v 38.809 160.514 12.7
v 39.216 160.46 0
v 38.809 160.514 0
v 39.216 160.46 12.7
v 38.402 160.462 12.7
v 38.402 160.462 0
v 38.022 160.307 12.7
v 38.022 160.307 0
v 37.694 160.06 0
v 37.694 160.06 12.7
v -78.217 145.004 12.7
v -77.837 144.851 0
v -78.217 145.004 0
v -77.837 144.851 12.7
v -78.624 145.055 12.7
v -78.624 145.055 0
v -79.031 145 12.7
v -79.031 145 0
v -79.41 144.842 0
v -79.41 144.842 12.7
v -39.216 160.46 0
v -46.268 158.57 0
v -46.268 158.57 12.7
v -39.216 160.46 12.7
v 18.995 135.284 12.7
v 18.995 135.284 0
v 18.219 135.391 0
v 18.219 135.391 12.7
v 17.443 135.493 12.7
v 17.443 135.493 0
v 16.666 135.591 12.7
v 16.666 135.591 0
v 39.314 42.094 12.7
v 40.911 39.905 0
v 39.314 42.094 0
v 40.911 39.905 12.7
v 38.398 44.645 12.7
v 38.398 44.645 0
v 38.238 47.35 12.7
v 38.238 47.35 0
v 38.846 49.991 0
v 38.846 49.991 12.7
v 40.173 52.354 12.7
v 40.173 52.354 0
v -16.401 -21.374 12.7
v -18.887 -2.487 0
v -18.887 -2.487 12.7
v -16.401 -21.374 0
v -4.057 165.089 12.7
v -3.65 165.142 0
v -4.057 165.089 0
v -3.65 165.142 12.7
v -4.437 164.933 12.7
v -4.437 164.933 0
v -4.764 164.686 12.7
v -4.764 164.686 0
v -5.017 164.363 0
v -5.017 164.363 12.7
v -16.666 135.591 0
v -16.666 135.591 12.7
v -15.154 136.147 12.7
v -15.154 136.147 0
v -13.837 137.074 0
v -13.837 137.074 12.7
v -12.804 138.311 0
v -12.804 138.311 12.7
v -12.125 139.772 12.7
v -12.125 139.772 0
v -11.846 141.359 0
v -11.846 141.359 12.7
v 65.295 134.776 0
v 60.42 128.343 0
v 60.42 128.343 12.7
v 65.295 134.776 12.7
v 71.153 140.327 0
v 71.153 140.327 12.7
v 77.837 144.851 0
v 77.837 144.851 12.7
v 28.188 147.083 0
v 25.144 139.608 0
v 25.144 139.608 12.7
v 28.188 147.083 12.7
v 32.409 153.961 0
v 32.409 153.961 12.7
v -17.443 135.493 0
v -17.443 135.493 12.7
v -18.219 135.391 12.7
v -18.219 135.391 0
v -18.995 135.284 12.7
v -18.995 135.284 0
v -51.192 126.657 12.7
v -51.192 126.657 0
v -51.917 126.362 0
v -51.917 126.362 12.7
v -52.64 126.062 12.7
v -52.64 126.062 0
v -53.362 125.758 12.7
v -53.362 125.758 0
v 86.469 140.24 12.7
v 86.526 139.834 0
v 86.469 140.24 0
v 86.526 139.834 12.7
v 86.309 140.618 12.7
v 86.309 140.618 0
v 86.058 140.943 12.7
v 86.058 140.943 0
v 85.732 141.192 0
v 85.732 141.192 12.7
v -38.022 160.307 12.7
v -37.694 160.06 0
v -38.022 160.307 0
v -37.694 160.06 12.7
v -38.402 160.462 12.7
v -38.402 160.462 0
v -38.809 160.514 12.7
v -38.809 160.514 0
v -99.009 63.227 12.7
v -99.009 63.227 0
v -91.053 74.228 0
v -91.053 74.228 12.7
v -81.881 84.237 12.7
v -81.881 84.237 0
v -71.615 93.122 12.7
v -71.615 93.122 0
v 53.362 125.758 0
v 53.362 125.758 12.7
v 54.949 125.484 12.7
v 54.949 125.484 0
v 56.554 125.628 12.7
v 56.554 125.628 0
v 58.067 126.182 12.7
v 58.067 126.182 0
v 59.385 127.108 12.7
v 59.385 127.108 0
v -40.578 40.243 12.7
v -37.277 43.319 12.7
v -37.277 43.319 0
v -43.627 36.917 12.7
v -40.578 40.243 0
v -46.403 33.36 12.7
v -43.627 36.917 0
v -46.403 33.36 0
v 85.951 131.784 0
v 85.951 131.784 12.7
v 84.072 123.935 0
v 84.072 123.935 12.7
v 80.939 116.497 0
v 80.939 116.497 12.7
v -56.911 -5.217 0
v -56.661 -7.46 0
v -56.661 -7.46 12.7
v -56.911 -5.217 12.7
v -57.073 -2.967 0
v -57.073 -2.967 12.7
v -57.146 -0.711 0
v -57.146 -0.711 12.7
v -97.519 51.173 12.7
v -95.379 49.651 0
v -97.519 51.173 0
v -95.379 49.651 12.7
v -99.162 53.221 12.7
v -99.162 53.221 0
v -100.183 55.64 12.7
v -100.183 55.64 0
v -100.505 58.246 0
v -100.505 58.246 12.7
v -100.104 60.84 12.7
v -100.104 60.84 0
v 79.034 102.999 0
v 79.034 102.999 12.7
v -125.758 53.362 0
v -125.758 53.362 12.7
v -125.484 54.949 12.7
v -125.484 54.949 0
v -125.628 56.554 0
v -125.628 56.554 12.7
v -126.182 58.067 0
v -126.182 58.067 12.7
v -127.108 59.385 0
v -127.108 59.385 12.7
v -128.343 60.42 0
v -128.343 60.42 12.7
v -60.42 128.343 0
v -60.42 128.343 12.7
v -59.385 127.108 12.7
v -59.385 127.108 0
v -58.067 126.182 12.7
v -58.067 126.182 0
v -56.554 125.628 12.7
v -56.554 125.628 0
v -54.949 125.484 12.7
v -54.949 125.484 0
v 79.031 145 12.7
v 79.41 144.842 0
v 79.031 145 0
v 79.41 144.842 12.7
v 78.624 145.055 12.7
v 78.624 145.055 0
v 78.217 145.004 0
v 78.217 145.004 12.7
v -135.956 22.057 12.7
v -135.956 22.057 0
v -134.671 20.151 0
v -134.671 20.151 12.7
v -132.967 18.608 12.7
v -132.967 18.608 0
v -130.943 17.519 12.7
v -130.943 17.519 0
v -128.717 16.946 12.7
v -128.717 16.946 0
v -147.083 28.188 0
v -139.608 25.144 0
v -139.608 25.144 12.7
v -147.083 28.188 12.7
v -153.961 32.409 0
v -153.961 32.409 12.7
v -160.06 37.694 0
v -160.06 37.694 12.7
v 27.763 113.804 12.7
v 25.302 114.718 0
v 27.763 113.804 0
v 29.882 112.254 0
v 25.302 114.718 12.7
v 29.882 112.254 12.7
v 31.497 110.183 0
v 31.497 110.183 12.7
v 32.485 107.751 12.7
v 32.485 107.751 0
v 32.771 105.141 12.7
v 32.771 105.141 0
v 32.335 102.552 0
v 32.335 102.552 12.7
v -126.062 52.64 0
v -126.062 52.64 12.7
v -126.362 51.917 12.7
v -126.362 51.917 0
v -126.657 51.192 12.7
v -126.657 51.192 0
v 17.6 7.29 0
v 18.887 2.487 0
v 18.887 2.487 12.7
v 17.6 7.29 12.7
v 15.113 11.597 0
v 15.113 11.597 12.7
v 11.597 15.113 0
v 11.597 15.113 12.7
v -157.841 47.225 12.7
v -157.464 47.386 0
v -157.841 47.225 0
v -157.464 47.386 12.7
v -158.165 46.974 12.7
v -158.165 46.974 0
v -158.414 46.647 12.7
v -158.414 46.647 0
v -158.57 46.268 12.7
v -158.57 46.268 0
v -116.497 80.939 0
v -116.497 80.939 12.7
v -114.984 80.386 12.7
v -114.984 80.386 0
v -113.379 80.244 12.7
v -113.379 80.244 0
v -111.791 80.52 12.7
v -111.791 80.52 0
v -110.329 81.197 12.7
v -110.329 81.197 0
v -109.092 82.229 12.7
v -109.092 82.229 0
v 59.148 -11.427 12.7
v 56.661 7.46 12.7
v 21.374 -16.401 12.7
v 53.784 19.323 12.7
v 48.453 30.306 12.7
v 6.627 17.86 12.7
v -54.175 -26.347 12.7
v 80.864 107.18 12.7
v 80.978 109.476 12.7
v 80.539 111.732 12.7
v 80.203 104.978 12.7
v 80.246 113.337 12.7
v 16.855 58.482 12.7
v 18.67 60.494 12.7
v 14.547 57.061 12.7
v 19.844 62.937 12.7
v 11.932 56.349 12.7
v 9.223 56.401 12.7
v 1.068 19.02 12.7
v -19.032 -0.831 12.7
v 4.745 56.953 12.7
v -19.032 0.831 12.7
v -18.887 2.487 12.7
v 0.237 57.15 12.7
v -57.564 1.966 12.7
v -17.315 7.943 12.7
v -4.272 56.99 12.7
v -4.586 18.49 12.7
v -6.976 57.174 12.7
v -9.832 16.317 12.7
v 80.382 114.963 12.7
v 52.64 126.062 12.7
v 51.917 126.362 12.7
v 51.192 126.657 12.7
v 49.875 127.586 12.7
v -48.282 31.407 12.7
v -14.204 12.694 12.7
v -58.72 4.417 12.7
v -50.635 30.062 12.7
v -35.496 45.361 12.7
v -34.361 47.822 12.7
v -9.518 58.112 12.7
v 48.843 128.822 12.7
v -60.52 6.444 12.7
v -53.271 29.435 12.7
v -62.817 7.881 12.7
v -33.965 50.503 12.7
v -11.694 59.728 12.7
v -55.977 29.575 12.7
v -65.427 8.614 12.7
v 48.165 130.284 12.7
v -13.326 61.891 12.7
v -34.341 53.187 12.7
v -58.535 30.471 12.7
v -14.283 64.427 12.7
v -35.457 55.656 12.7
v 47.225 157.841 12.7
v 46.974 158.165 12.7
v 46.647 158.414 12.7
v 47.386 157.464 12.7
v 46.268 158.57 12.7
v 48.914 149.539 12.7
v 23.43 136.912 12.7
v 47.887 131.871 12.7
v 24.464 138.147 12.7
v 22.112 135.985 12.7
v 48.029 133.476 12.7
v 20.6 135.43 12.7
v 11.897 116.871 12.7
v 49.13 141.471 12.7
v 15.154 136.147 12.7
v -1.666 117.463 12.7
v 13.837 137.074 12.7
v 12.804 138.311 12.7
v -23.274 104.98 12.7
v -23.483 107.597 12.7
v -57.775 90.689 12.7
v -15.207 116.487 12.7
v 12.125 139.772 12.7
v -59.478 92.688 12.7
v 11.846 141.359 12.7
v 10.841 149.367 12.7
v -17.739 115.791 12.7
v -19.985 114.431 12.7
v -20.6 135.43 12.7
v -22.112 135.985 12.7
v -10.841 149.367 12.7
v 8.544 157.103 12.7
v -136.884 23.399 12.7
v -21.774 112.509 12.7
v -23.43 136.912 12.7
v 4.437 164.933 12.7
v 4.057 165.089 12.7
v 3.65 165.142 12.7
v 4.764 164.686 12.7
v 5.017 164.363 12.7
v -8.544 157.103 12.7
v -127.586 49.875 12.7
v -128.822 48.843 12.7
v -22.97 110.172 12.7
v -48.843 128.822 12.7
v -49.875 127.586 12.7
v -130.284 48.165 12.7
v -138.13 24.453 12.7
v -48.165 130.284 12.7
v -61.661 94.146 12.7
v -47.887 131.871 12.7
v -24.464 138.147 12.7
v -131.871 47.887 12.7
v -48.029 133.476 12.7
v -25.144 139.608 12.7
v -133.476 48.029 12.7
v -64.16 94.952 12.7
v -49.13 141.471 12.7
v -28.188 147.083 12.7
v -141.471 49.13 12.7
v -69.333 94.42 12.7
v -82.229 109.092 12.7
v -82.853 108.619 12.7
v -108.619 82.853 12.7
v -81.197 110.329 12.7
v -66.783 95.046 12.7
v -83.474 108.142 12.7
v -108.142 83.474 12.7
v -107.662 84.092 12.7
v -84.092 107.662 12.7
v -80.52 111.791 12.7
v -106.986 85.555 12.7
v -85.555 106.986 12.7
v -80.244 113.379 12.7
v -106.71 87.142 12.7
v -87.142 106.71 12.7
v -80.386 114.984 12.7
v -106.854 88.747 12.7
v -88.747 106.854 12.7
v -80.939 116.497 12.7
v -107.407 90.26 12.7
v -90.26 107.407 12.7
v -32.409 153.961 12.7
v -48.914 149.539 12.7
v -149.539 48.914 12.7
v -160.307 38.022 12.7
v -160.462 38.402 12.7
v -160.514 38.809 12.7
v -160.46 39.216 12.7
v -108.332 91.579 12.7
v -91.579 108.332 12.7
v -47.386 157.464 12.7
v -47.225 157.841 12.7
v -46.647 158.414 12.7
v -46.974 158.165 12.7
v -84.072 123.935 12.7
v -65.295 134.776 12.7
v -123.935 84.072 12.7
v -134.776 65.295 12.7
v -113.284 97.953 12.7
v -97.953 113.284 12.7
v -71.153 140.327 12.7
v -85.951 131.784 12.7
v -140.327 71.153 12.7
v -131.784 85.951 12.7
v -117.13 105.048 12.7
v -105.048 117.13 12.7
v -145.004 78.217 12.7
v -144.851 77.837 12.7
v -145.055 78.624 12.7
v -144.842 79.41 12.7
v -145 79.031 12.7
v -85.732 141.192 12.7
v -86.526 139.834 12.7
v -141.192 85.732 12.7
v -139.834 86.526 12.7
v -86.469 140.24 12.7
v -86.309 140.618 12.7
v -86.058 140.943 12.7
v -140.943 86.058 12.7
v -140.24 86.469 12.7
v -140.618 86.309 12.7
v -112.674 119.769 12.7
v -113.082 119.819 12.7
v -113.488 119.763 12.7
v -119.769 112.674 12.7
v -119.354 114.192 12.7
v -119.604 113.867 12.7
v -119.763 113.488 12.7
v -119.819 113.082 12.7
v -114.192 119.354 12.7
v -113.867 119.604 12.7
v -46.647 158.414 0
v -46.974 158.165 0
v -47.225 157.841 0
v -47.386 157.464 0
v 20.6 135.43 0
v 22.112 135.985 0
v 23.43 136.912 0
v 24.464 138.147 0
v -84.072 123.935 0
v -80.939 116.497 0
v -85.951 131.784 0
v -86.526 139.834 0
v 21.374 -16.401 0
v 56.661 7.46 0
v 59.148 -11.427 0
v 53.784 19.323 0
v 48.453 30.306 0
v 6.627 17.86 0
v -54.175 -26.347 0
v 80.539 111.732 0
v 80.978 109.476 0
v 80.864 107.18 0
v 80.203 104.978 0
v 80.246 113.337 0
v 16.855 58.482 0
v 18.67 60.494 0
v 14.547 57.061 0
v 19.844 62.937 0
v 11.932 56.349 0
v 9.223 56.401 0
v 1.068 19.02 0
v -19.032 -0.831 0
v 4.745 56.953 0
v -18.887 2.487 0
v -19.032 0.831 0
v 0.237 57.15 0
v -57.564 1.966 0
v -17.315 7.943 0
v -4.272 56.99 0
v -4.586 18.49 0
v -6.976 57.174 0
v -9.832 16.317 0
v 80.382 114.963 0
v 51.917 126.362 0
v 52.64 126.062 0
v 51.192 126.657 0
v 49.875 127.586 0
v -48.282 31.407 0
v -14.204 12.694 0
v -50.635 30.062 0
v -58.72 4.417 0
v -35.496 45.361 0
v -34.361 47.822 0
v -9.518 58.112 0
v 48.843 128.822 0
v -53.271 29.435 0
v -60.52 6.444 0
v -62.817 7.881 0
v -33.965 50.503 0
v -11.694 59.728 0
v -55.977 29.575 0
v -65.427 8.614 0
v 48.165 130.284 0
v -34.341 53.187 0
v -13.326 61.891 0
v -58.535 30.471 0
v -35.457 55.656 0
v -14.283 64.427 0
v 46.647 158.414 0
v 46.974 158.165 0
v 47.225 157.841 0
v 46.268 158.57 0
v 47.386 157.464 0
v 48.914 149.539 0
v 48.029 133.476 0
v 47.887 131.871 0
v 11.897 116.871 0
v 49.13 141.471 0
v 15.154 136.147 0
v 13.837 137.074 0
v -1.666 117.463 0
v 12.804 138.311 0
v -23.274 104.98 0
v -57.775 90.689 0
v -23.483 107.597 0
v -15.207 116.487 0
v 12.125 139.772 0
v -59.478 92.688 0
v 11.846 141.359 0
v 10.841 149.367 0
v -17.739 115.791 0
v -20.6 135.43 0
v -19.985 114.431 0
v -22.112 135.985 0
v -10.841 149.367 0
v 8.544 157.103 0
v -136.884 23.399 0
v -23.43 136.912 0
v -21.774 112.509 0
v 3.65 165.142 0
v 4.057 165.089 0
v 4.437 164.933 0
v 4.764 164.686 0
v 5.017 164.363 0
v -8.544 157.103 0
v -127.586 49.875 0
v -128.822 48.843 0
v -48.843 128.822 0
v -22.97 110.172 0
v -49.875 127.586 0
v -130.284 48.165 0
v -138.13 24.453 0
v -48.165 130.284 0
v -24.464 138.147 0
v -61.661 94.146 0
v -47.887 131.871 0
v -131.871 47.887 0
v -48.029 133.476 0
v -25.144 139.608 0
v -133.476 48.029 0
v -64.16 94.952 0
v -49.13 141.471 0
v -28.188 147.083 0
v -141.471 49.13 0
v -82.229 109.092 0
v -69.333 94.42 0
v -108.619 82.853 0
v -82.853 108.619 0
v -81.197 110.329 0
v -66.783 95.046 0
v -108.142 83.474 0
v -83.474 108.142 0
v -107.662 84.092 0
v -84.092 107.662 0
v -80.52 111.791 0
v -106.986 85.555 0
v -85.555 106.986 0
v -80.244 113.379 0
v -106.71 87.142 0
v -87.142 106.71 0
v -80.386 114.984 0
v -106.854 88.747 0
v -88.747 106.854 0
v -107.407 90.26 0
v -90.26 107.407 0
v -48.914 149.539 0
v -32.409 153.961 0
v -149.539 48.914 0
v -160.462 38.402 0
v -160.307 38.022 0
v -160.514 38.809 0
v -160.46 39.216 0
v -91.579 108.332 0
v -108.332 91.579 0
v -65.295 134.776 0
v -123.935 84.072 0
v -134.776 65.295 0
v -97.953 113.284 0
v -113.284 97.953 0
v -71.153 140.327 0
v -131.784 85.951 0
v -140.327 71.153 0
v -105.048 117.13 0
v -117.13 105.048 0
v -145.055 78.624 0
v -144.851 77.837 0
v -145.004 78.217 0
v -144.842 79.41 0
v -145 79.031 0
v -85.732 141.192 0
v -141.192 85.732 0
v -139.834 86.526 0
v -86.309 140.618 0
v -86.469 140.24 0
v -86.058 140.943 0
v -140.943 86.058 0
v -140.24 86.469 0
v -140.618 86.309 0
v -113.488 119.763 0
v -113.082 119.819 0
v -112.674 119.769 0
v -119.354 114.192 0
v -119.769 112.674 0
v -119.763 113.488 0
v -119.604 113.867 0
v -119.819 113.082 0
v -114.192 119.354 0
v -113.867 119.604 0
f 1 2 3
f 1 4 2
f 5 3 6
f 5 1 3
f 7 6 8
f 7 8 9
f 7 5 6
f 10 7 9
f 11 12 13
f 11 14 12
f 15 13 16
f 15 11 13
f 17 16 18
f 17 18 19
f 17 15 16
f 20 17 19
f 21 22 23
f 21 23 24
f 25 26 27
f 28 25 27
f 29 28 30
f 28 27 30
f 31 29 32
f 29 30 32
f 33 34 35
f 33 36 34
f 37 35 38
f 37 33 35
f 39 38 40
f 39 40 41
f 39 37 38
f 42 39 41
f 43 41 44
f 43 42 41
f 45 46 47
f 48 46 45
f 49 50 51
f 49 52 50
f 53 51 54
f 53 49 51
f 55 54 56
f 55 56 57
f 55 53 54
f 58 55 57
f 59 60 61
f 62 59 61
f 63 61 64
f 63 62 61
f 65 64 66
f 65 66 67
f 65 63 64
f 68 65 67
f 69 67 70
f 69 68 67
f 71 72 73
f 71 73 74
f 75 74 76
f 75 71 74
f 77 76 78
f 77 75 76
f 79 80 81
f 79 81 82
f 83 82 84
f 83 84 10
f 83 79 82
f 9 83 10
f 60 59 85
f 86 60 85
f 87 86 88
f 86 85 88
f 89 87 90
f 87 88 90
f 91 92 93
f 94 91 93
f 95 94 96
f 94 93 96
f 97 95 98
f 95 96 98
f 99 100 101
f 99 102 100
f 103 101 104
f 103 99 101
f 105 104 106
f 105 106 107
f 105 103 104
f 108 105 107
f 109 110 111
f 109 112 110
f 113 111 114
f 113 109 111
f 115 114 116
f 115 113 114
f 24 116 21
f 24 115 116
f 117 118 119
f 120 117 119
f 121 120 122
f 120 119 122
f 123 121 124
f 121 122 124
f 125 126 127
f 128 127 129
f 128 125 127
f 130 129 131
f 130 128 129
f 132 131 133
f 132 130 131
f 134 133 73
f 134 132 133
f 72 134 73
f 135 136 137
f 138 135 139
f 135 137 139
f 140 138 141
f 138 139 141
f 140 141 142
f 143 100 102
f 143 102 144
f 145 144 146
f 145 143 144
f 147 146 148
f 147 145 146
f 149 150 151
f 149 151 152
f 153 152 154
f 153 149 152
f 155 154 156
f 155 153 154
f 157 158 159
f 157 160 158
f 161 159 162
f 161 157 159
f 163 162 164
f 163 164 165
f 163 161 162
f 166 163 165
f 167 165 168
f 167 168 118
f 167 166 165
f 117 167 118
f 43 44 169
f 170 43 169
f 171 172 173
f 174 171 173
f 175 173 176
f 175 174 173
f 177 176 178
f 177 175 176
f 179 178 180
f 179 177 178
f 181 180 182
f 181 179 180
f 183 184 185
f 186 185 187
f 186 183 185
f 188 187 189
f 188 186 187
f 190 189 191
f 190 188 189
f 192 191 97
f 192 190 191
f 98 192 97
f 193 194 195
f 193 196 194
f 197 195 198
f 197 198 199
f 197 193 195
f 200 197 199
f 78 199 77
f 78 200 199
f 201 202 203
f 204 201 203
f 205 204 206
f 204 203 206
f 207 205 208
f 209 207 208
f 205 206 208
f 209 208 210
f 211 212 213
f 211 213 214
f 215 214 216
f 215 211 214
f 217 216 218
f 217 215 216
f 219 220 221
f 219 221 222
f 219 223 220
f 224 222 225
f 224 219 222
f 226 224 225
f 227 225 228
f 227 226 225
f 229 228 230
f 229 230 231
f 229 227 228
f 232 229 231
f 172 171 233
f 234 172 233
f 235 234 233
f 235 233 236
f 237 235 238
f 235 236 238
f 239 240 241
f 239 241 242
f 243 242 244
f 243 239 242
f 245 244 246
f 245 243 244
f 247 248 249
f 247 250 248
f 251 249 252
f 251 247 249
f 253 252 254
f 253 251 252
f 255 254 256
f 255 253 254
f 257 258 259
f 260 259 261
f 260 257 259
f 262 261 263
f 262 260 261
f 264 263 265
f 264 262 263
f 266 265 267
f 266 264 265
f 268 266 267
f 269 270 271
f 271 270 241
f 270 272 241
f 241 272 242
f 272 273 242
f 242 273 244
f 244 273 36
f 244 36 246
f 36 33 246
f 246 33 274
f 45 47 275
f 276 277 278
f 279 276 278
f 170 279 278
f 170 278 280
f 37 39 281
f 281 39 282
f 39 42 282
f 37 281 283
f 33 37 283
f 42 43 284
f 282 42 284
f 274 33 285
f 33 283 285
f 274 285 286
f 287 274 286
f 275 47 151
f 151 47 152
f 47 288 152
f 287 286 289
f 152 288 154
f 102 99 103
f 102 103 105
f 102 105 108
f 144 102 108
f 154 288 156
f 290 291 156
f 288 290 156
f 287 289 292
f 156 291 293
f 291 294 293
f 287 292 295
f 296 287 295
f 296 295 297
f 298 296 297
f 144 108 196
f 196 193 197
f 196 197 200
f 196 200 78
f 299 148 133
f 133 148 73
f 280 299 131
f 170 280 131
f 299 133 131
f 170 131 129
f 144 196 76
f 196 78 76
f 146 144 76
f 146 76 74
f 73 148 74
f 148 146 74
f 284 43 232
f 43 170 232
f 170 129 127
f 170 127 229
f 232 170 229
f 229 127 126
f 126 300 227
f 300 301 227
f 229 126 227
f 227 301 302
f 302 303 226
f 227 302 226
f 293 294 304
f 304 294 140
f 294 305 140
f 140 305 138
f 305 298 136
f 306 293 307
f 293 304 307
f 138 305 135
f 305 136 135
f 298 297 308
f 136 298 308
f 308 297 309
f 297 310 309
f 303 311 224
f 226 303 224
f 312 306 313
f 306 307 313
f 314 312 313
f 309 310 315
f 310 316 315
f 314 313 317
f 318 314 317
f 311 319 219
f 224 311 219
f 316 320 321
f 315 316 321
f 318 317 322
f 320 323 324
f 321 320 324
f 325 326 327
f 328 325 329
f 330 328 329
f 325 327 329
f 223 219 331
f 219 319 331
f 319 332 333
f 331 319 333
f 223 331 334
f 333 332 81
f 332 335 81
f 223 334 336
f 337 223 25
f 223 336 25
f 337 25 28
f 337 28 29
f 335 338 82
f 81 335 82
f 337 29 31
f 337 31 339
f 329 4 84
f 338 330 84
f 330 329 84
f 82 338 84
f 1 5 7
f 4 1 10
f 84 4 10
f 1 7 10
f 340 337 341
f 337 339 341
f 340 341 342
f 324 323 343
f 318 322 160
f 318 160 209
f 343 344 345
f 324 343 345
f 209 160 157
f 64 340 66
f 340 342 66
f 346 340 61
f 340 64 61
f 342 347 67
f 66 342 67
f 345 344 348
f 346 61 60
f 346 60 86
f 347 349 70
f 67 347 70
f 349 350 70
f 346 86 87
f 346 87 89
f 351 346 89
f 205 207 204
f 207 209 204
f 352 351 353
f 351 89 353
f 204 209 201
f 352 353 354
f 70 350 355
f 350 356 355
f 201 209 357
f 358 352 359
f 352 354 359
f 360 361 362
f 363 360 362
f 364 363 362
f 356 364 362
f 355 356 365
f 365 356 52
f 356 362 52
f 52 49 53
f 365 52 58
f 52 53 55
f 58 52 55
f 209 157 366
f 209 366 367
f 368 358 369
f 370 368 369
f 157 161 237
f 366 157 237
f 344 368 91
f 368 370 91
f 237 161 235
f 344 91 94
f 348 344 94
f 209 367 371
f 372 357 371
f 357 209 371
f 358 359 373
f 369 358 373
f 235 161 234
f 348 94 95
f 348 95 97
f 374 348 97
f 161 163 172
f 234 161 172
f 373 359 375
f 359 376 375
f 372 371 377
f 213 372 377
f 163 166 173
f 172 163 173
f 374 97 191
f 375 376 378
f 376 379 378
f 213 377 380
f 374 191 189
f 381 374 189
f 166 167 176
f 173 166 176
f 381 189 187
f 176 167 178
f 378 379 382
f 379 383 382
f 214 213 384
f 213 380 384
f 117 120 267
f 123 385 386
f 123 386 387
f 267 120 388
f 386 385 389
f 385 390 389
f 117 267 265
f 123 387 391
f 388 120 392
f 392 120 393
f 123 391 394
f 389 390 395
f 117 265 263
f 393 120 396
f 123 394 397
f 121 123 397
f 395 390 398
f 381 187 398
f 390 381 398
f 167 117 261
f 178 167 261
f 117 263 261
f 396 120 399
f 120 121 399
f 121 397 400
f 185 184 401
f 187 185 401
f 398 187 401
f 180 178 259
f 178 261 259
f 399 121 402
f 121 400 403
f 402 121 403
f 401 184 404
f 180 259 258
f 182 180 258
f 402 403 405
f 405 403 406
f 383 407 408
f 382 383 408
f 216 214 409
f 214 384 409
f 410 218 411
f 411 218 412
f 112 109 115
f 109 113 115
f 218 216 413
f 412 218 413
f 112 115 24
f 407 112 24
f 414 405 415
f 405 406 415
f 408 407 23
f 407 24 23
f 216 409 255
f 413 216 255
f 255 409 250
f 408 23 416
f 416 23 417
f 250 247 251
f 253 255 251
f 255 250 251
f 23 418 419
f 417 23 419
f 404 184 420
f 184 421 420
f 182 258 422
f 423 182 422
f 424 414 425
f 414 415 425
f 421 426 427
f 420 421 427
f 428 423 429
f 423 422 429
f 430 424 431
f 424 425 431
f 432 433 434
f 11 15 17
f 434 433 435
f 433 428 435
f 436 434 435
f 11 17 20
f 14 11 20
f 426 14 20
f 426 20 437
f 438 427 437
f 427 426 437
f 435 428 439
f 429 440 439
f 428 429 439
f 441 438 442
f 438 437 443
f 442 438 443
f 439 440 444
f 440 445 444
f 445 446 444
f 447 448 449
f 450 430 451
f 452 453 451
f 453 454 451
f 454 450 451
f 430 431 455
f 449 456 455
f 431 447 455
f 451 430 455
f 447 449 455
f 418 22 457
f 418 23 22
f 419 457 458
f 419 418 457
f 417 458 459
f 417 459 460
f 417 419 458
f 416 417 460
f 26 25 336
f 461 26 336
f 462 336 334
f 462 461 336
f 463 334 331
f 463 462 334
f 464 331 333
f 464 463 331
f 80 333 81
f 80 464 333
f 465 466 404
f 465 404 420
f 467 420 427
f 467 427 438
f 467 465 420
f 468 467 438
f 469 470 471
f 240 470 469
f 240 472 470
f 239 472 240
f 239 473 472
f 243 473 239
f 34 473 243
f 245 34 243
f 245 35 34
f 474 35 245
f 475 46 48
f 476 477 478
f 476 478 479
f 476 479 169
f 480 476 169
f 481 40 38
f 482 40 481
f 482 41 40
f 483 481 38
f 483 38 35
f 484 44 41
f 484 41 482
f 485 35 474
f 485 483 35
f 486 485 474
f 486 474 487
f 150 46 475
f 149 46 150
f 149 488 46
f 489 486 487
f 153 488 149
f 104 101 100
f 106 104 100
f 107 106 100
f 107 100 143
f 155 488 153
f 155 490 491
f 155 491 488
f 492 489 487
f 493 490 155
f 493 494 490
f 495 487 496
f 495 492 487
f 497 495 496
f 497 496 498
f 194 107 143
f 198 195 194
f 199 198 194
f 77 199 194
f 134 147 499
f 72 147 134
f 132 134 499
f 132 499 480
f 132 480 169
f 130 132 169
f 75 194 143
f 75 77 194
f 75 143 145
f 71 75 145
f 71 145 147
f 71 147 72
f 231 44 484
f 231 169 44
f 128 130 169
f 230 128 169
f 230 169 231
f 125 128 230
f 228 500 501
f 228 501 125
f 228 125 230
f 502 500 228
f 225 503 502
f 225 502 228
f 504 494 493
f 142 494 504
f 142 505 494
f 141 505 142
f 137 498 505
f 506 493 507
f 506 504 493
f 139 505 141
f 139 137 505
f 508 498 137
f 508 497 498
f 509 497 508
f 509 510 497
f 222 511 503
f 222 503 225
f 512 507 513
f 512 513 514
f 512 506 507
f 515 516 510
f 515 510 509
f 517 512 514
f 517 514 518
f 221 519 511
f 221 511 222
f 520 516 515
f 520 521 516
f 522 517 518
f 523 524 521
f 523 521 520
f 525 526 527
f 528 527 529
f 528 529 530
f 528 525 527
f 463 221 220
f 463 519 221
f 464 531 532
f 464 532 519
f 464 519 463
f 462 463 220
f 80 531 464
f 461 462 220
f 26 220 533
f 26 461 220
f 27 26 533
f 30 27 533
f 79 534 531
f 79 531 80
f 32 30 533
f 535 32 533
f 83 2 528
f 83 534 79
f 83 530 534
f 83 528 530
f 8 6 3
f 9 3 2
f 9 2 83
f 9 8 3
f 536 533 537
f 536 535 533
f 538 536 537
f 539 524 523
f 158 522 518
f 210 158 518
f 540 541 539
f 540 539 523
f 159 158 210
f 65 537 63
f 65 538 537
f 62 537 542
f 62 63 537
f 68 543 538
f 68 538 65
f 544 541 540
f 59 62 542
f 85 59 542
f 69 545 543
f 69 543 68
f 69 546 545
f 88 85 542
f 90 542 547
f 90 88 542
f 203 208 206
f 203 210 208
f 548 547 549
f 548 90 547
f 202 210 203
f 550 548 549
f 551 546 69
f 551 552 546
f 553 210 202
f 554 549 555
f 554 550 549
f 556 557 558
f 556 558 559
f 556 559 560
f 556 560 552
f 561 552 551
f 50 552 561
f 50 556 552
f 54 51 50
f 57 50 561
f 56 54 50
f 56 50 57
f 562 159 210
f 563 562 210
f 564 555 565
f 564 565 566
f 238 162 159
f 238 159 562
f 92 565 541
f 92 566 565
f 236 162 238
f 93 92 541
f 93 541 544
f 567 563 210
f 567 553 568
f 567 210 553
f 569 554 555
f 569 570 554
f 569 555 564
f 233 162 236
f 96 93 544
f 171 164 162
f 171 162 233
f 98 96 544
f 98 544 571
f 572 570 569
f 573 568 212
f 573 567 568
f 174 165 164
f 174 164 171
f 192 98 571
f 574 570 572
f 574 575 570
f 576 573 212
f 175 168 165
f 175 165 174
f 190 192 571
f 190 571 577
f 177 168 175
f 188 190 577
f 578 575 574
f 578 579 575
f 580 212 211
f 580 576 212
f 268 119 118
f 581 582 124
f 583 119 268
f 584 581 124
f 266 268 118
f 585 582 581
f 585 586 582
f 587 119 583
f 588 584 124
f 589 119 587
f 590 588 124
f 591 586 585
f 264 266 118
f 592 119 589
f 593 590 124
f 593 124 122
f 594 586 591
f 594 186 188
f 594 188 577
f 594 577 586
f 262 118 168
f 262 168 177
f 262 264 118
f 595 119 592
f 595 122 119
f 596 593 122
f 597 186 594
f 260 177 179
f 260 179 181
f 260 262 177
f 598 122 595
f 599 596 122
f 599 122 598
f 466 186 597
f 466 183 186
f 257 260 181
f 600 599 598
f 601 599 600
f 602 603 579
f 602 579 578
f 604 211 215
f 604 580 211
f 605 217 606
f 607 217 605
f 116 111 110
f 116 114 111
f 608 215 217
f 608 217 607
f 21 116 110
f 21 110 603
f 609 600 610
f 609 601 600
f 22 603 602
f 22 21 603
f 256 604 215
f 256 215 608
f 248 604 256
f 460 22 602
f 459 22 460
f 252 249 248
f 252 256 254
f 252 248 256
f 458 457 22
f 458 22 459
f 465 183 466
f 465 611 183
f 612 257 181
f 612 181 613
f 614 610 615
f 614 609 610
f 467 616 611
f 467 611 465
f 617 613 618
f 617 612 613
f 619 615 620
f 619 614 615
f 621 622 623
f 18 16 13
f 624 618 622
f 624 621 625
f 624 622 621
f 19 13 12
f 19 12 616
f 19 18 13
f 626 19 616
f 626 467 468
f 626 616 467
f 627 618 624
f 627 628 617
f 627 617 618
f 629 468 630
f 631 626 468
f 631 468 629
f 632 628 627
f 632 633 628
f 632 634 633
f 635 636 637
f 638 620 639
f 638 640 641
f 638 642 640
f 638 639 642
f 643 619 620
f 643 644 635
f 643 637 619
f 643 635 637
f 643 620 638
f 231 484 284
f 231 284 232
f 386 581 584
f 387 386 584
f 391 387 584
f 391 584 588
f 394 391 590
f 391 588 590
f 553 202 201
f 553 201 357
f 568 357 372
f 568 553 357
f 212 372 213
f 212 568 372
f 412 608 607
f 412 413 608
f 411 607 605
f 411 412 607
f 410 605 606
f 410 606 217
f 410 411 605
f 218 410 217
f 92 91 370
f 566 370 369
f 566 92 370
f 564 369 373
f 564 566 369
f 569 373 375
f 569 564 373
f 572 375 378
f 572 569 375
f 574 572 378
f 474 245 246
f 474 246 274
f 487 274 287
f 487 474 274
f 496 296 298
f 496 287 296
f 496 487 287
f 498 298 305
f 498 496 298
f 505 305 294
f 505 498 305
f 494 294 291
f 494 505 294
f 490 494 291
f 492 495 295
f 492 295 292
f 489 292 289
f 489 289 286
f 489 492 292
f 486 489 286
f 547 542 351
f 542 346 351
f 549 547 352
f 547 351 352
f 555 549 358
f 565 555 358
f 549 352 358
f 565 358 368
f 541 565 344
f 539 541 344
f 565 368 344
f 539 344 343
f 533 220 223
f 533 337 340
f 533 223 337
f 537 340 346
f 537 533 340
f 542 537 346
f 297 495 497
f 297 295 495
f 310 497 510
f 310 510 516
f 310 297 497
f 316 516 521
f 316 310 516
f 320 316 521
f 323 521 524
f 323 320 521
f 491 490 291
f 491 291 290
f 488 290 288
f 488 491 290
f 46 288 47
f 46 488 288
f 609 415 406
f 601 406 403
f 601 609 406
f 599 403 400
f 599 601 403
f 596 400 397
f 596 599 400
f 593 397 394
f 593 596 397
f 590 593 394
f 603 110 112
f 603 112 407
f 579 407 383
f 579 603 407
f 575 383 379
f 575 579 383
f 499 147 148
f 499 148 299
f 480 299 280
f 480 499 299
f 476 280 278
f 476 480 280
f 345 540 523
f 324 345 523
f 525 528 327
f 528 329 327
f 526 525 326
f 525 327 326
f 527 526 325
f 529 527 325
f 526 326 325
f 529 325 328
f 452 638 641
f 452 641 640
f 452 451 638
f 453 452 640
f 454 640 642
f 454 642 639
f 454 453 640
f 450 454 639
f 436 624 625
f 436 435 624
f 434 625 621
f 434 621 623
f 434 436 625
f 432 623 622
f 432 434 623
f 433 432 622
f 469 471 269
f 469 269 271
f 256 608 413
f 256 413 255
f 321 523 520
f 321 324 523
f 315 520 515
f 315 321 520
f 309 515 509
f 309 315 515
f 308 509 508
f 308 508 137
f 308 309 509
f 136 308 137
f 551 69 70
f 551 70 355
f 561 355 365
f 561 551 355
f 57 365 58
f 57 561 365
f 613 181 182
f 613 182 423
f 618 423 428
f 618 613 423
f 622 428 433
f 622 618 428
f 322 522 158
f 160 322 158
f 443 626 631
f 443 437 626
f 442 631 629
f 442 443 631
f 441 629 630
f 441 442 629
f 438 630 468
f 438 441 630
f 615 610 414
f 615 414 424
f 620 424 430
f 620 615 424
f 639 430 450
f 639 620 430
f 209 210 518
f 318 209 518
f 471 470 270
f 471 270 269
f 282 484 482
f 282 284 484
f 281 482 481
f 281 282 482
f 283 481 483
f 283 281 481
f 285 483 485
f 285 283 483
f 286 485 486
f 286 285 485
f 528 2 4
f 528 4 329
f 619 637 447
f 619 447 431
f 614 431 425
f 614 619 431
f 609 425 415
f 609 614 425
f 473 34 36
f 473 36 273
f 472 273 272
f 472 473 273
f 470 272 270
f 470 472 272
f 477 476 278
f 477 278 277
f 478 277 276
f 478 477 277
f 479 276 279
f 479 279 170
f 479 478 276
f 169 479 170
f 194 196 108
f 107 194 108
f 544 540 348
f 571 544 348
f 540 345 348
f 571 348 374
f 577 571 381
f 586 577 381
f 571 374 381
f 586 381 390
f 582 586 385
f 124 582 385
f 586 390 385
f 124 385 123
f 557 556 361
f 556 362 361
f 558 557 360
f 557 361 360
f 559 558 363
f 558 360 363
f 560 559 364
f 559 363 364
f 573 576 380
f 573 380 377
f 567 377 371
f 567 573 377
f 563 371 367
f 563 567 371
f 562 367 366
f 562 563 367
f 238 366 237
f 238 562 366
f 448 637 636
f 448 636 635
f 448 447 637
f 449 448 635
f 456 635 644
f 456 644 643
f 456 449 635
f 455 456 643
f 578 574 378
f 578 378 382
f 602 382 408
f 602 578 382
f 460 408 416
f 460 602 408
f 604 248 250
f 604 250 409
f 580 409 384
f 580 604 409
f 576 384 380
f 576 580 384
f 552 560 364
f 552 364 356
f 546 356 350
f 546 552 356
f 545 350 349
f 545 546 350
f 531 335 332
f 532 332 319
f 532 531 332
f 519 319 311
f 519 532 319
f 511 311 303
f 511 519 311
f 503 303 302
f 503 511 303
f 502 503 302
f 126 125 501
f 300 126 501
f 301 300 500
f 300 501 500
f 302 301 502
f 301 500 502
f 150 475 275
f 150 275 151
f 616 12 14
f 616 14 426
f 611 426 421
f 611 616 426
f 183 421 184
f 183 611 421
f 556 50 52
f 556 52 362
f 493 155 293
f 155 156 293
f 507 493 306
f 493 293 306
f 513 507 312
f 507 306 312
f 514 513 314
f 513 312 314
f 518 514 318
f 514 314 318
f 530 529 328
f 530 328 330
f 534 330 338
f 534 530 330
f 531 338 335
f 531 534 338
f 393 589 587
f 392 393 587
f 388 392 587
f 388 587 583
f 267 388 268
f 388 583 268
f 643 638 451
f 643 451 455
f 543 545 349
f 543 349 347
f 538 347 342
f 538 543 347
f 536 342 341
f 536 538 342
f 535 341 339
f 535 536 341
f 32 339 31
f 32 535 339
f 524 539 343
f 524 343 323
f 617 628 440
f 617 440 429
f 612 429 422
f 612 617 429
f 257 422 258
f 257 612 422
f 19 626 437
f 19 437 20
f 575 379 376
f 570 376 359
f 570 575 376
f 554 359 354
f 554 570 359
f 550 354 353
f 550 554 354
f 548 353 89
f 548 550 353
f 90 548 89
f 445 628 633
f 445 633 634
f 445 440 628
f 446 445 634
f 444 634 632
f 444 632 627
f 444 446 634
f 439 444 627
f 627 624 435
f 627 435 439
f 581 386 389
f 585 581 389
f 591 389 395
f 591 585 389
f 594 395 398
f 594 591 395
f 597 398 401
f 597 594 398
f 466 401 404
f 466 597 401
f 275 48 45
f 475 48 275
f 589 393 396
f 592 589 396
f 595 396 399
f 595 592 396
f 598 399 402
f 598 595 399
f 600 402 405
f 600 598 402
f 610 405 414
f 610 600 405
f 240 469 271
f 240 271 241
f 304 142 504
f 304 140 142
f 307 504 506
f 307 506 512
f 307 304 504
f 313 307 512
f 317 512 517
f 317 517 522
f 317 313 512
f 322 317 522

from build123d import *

# Parameters (mm, degrees)
SKETCH3_R                = 136.611351841
EXTRUDE1_DEPTH           = 12.7
EXTRUDE2_DEPTH           = 12.7
FILLET2_R                = 1.5875
CIRPATTERN1_COUNT        = 24
FILLET2_OF_CIRPATTERN1_R = 1.5875
CUT_EXTRUDE1_DEPTH       = 234.890969431
CUT_EXTRUDE1_DEPTH_BACK  = 234.890969431
CUT_EXTRUDE2_REACH       = 232.646
SKETCH5_R                = 19.05
EXTRUDE3_DEPTH           = 12.7
CUT_EXTRUDE5_DEPTH       = 231.646456089
FILLET1_R                = 9.525
CUT_EXTRUDE7_DEPTH       = 12.7


with BuildPart() as part:
    # Sketch3 → Extrude1 (new body)
    with BuildSketch(Plane.XY):
        Circle(SKETCH3_R)
    extrude(amount=EXTRUDE1_DEPTH)

    # Sketch2 → Extrude2 (add)
    with BuildSketch(Plane.XY):
        with BuildLine():
            Line((-4.546074008, 165.141901983), (4.546074008, 165.141901983))
            ThreePointArc((4.546074008, 165.141901983), (9.719017906, 153.717756782), (11.846410355, 141.35876639))
            ThreePointArc((11.846410355, 141.35876639), (13.677789854, 137.226095775), (17.83135957, 135.442622788))
            Line((17.83135957, 135.442622788), (17.83135957, 110.042622788))
            Line((17.83135957, 110.042622788), (-17.83135957, 110.042622788))
            Line((-17.83135957, 110.042622788), (-17.83135957, 135.442622788))
            ThreePointArc((-17.83135957, 135.442622788), (-13.677789854, 137.226095775), (-11.846410355, 141.35876639))
            ThreePointArc((-11.846410355, 141.35876639), (-9.719017906, 153.717756782), (-4.546074008, 165.141901983))
        make_face()
    extrude2 = extrude(amount=EXTRUDE2_DEPTH)

    # Fillet2
    fillet2_edges = [part.edges().sort_by_distance(p)[0] for p in [
        (4.546074008, 165.141901983, 6.35),
        (-4.546074008, 165.141901983, 6.35),
    ]]
    fillet(fillet2_edges, radius=FILLET2_R)

    # CirPattern1: Extrude2 ×24 about axis
    cirpattern1_axis = Axis((0, 0, 0), (0, 0, 1))
    for i in range(1, CIRPATTERN1_COUNT):
        add(extrude2.rotate(cirpattern1_axis, i * 360 / CIRPATTERN1_COUNT))

    # Fillet2 of CirPattern1
    fillet2_of_cirpattern1_edges = [part.edges().sort_by_distance(p)[0] for p in [
        (-38.350699085, 160.691438662, 6.35),
        (-47.13303967, 158.338217595, 6.35),
        (-78.633935413, 145.290119351, 6.35),
        (-86.50796657, 140.744045343, 6.35),
        (-113.558398992, 119.987518509, 6.35),
        (-119.987518509, 113.558398992, 6.35),
        (-140.744045343, 86.50796657, 6.35),
        (-145.290119351, 78.633935413, 6.35),
        (-158.338217595, 47.13303967, 6.35),
        (-160.691438662, 38.350699085, 6.35),
        (-165.141901983, 4.546074008, 6.35),
        (-165.141901983, -4.546074008, 6.35),
        (-160.691438662, -38.350699085, 6.35),
        (-158.338217595, -47.13303967, 6.35),
        (-145.290119351, -78.633935413, 6.35),
        (-140.744045343, -86.50796657, 6.35),
        (-119.987518509, -113.558398992, 6.35),
        (-113.558398992, -119.987518509, 6.35),
        (-86.50796657, -140.744045343, 6.35),
        (-78.633935413, -145.290119351, 6.35),
        (-47.13303967, -158.338217595, 6.35),
        (-38.350699085, -160.691438662, 6.35),
        (-4.546074008, -165.141901983, 6.35),
        (4.546074008, -165.141901983, 6.35),
        (38.350699085, -160.691438662, 6.35),
        (47.13303967, -158.338217595, 6.35),
        (78.633935413, -145.290119351, 6.35),
        (86.50796657, -140.744045343, 6.35),
        (113.558398992, -119.987518509, 6.35),
        (119.987518509, -113.558398992, 6.35),
        (140.744045343, -86.50796657, 6.35),
        (145.290119351, -78.633935413, 6.35),
        (158.338217595, -47.13303967, 6.35),
        (160.691438662, -38.350699085, 6.35),
        (165.141901983, -4.546074008, 6.35),
        (165.141901983, 4.546074008, 6.35),
        (160.691438662, 38.350699085, 6.35),
        (158.338217595, 47.13303967, 6.35),
        (145.290119351, 78.633935413, 6.35),
        (140.744045343, 86.50796657, 6.35),
        (119.987518509, 113.558398992, 6.35),
        (113.558398992, 119.987518509, 6.35),
        (86.50796657, 140.744045343, 6.35),
        (78.633935413, 145.290119351, 6.35),
        (47.13303967, 158.338217595, 6.35),
        (38.350699085, 160.691438662, 6.35),
    ]]
    fillet(fillet2_of_cirpattern1_edges, radius=FILLET2_OF_CIRPATTERN1_R)

    # Sketch4 → Cut-Extrude1 (cut, two sides: drawn at the far end of the back side and taken through both)
    with BuildSketch(Plane.XY.offset(-CUT_EXTRUDE1_DEPTH_BACK)):
        Polygon((-1275.53694573, 167.92762467), (-268.218413087, 35.311623982), (0, 0), (164.689969961, 214.628147505), (783.198061827, 1020.683586133), (1560.818943381, -856.6592925), (-497.916064176, -1709.415253962), align=None)
    extrude(amount=CUT_EXTRUDE1_DEPTH + CUT_EXTRUDE1_DEPTH_BACK, mode=Mode.SUBTRACT)

    # Sketch5 → Cut-Extrude2 (cut, up to next)
    with BuildSketch(Plane.XY, mode=Mode.PRIVATE) as cut_extrude2_sk1:
        Circle(SKETCH5_R)
    cut_extrude2_tool1 = extrude(cut_extrude2_sk1.sketch, amount=CUT_EXTRUDE2_REACH, mode=Mode.PRIVATE) & part.part
    add(cut_extrude2_tool1.solids().sort_by_distance((0, 0, 0))[0], mode=Mode.SUBTRACT)

    # Sketch6 → Extrude3 (add)
    with BuildSketch(Plane.XY):
        with BuildLine():
            Line((-18.887024609, -2.486523962), (-16.400500647, -21.373548571))
            Line((-16.400500647, -21.373548571), (-54.174549866, -26.346596495))
            Line((-54.174549866, -26.346596495), (-56.661073828, -7.459571885))
            ThreePointArc((-56.661073828, -7.459571885), (-57.15, 0), (-56.661073828, 7.459571885))
            Line((-56.661073828, 7.459571885), (-18.887024609, 2.486523962))
            ThreePointArc((-18.887024609, 2.486523962), (-19.05, 0), (-18.887024609, -2.486523962))
        make_face()
        with BuildLine():
            Line((11.596905223, 15.113381133), (34.790715668, 45.340143398))
            ThreePointArc((34.790715668, 45.340143398), (49.493351826, 28.575), (56.661073828, 7.459571885))
            Line((56.661073828, 7.459571885), (59.147597789, -11.427452724))
            Line((59.147597789, -11.427452724), (21.373548571, -16.400500647))
            Line((21.373548571, -16.400500647), (18.887024609, 2.486523962))
            ThreePointArc((18.887024609, 2.486523962), (16.497783942, 9.525), (11.596905223, 15.113381133))
        make_face()
    extrude(amount=EXTRUDE3_DEPTH)

    # Sketch8 → Cut-Extrude5 (cut, through all)
    with BuildSketch(Plane.XY):
        with BuildLine():
            Line((-25.426243647, 114.690373436), (-12.369523937, 55.795316807))
            ThreePointArc((-12.369523937, 55.795316807), (2.492847988, 57.095605863), (17.185336442, 54.504923735))
            Line((17.185336442, 54.504923735), (35.325413797, 112.037898789))
            ThreePointArc((35.325413797, 112.037898789), (5.124187531, 117.36318983), (-25.426243647, 114.690373436))
        make_face()
        with BuildLine():
            Line((-63.119271491, 99.077410097), (-30.706672617, 48.199821128))
            ThreePointArc((-30.706672617, 48.199821128), (-42.135399799, 38.609980365), (-50.692669116, 26.388933246))
            Line((-50.692669116, 26.388933246), (-104.201597628, 54.24391834))
            ThreePointArc((-104.201597628, 54.24391834), (-86.611655142, 79.36495964), (-63.119271491, 99.077410097))
        make_face()
    extrude(amount=CUT_EXTRUDE5_DEPTH, mode=Mode.SUBTRACT)

    # Fillet1
    fillet1_edges = [part.edges().sort_by_distance(p)[0] for p in [
        (34.790715668, 45.340143398, 6.35),
        (-50.692669116, 26.388933246, 6.35),
        (-30.706672617, 48.199821128, 6.35),
        (-63.119271491, 99.077410097, 6.35),
        (-104.201597628, 54.24391834, 6.35),
        (-12.369523937, 55.795316807, 6.35),
        (17.185336442, 54.504923735, 6.35),
        (35.325413797, 112.037898789, 6.35),
        (-25.426243647, 114.690373436, 6.35),
        (-56.661073828, 7.459571885, 6.35),
    ]]
    fillet(fillet1_edges, radius=FILLET1_R)

    # Sketch9 → Cut-Extrude7 (cut)
    with BuildSketch(Plane.XY):
        with BuildLine():
            Line((79.034097122, 102.999240689), (83.809524096, 109.222698287))
            Line((83.809524096, 109.222698287), (80.539107883, 111.732176909))
            ThreePointArc((80.539107883, 111.732176909), (80.864034333, 107.180027092), (79.034097122, 102.999240689))
        make_face()
        with BuildLine():
            Line((-128.717007568, 16.945915528), (-136.494393434, 17.969827802))
            Line((-136.494393434, 17.969827802), (-135.956329304, 22.056830634))
            ThreePointArc((-135.956329304, 22.056830634), (-132.967230996, 18.608216933), (-128.717007568, 16.945915528))
        make_face()
    extrude(amount=CUT_EXTRUDE7_DEPTH, mode=Mode.SUBTRACT)


solid = part.part
